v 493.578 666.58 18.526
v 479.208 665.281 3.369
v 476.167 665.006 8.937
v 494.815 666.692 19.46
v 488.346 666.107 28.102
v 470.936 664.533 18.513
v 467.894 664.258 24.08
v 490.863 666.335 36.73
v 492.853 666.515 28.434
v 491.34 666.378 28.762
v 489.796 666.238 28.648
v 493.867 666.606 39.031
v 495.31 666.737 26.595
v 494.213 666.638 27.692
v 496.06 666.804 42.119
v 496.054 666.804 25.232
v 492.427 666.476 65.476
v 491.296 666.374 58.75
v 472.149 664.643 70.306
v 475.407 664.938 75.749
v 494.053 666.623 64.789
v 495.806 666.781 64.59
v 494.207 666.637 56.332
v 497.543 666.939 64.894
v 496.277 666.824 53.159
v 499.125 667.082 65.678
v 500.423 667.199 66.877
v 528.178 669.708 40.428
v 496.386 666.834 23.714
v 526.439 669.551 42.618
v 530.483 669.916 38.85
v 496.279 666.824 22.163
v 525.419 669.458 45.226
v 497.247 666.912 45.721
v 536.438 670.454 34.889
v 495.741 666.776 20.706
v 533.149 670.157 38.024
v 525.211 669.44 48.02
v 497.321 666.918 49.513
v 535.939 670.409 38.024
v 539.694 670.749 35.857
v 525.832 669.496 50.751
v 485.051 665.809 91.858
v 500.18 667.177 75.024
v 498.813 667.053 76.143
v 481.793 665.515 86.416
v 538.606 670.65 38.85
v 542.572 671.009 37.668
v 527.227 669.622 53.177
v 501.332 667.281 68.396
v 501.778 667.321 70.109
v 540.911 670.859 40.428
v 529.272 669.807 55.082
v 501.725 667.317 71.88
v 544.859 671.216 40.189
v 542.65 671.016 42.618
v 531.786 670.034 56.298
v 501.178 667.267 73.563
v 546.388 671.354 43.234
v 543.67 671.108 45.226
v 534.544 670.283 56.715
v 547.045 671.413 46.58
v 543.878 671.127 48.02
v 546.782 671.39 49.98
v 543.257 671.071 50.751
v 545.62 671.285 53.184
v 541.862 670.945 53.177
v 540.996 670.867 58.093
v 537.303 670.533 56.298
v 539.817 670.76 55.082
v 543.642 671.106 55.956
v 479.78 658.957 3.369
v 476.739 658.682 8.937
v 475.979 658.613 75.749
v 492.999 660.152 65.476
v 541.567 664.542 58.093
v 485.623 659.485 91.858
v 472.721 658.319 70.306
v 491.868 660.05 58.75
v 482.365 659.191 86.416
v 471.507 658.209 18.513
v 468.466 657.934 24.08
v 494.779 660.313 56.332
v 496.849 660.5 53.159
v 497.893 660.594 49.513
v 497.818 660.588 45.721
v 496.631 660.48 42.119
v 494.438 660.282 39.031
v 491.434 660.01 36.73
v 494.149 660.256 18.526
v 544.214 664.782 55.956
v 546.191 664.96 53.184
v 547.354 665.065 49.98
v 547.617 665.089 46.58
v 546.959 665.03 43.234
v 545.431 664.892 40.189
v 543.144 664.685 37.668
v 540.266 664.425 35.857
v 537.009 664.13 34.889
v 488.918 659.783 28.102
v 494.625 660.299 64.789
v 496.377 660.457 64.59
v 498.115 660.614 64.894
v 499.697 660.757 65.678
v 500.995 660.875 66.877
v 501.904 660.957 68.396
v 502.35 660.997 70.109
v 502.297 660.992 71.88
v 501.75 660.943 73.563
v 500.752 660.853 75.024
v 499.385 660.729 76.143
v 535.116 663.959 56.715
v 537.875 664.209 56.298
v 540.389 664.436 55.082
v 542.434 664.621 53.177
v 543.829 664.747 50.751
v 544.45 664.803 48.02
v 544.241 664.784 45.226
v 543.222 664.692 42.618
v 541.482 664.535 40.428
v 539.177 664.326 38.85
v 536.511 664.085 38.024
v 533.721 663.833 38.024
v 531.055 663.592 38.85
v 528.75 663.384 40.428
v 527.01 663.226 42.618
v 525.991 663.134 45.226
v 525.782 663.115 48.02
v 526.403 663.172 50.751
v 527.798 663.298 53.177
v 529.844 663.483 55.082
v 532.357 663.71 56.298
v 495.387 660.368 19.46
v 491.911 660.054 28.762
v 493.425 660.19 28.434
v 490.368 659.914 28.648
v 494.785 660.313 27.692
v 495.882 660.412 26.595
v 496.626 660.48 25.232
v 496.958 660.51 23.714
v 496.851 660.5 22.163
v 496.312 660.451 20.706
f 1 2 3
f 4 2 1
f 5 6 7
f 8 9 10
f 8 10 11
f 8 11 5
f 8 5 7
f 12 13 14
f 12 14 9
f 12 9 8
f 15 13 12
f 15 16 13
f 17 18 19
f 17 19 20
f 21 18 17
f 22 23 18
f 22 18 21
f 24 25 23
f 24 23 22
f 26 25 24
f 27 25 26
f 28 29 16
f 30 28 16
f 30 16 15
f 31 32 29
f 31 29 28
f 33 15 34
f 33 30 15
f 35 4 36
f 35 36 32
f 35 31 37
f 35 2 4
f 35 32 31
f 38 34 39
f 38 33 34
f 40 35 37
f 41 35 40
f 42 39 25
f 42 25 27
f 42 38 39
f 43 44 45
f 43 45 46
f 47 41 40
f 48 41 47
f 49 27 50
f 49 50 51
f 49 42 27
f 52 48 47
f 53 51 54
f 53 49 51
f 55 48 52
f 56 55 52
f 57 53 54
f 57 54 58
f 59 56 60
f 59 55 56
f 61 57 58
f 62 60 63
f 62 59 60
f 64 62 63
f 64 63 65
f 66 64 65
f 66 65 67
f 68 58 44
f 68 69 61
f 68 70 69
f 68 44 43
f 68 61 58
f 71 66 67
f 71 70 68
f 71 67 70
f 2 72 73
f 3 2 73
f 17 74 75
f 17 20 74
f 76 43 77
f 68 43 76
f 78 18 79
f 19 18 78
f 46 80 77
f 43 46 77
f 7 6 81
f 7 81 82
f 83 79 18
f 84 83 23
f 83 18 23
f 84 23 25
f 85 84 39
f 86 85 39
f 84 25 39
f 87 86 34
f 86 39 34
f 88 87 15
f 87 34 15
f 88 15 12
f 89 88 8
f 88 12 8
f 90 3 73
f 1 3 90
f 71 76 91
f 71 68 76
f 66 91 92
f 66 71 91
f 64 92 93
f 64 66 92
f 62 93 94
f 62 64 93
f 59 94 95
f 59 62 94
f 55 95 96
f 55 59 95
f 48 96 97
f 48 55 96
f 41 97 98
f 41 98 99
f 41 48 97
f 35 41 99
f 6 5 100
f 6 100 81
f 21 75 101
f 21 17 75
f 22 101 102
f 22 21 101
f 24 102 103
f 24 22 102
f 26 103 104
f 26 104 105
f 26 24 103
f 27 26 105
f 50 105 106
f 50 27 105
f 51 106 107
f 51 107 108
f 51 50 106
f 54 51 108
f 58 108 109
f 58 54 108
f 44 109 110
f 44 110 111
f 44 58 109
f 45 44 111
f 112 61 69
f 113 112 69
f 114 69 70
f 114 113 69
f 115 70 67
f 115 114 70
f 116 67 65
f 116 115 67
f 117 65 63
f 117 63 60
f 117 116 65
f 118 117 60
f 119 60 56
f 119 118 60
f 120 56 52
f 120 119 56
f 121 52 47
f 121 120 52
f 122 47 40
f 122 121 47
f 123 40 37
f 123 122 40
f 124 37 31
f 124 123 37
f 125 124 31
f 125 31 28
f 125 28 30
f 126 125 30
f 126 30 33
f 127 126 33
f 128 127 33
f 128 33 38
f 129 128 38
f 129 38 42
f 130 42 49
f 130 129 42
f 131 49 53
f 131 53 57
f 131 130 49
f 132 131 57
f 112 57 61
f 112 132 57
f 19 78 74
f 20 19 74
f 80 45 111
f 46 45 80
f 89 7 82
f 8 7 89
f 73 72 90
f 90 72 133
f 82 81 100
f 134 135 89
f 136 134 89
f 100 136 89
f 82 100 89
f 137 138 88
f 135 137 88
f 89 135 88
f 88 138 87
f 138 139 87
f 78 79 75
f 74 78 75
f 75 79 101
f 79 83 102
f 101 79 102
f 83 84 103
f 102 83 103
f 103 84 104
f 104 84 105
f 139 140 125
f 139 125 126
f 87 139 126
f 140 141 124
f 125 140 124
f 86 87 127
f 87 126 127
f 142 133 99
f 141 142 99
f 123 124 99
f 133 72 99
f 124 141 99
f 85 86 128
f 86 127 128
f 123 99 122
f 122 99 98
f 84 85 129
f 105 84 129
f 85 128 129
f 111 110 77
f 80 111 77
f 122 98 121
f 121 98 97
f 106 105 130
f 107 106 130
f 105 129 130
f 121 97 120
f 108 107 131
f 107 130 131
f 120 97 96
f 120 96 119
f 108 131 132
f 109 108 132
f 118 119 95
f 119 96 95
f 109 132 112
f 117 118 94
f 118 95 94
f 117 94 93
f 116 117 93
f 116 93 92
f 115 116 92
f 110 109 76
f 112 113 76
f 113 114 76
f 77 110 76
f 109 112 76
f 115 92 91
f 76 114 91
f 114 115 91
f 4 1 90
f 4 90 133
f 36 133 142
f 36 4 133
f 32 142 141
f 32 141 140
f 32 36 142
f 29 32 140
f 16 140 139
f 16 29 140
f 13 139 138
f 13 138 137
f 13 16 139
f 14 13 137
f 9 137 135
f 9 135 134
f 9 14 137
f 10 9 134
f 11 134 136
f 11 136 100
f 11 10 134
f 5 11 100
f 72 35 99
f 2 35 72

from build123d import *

# Parameters (mm, degrees)
SKETCH1_R           = 12.573
SKETCH1_R_2         = 9.398
BOSS_EXTRUDE1_DEPTH = 3.175
FILLET1_R           = 12.7


with BuildPart() as part:
    # Sketch1 → Boss-Extrude1 (new body, symmetric)
    with BuildSketch(Plane(origin=(-54.155377654, 613.87875058, 32.992743825), x_dir=(0, 0, 1), z_dir=(-0.090029847, 0.995939068, 0))):
        with BuildLine():
            Line((1.896014785, 593.288148249), (-29.623565633, 535.82564653))
            Line((-29.623565633, 535.82564653), (-24.056128994, 532.771772062))
            Line((-24.056128994, 532.771772062), (-14.466963164, 550.253523109))
            ThreePointArc((-14.466963164, 550.253523109), (-7.052635612, 552.415186576), (-4.890972145, 545.000859024))
            Line((-4.890972145, 545.000859024), (-14.480137975, 527.519107976))
            Line((-14.480137975, 527.519107976), (-8.912701335, 524.465233508))
            Line((-8.912701335, 524.465233508), (14.368665453, 566.908868904))
            Line((14.368665453, 566.908868904), (3.548423472, 584.90983519))
            ThreePointArc((3.548423472, 584.90983519), (1.989104795, 588.954403604), (1.896014785, 593.288148249))
        make_face()
        with BuildLine():
            ThreePointArc((22.606879083, 581.927735227), (12.380822619, 578.965387193), (3.548423472, 584.90983519))
            Line((3.548423472, 584.90983519), (14.368665453, 566.908868904))
            Line((14.368665453, 566.908868904), (22.606879083, 581.927735227))
        make_face()
        with BuildLine():
            Line((58.865434837, 541.692100135), (25.100547859, 597.864650913))
            ThreePointArc((25.100547859, 597.864650913), (26.43992538, 594.748262171), (26.897485666, 591.387243051))
            ThreePointArc((26.897485666, 591.387243051), (25.774700979, 586.193699148), (22.606879083, 581.927735227))
            Line((22.606879083, 581.927735227), (14.368665453, 566.908868904))
            Line((14.368665453, 566.908868904), (37.31331045, 528.737284412))
            Line((37.31331045, 528.737284412), (42.755766103, 532.008702524))
            Line((42.755766103, 532.008702524), (32.483513232, 549.098013274))
            ThreePointArc((32.483513232, 549.098013274), (34.611130022, 557.637609564), (43.150726312, 555.509992774))
            Line((43.150726312, 555.509992774), (53.422979184, 538.420682023))
            Line((53.422979184, 538.420682023), (58.865434837, 541.692100135))
        make_face()
        with Locations((14.324485666, 591.387243051)):
            Circle(SKETCH1_R)
        with Locations((14.324485666, 591.387243051)):
            Circle(SKETCH1_R_2, mode=Mode.SUBTRACT)
    extrude(amount=BOSS_EXTRUDE1_DEPTH, both=True)

    # Fillet1
    fillet1_edges = [part.edges().sort_by_distance(p)[0] for p in [
        (510.451312753, 664.917469113, 47.361409278),
    ]]
    fillet(fillet1_edges, radius=FILLET1_R)


solid = part.part
